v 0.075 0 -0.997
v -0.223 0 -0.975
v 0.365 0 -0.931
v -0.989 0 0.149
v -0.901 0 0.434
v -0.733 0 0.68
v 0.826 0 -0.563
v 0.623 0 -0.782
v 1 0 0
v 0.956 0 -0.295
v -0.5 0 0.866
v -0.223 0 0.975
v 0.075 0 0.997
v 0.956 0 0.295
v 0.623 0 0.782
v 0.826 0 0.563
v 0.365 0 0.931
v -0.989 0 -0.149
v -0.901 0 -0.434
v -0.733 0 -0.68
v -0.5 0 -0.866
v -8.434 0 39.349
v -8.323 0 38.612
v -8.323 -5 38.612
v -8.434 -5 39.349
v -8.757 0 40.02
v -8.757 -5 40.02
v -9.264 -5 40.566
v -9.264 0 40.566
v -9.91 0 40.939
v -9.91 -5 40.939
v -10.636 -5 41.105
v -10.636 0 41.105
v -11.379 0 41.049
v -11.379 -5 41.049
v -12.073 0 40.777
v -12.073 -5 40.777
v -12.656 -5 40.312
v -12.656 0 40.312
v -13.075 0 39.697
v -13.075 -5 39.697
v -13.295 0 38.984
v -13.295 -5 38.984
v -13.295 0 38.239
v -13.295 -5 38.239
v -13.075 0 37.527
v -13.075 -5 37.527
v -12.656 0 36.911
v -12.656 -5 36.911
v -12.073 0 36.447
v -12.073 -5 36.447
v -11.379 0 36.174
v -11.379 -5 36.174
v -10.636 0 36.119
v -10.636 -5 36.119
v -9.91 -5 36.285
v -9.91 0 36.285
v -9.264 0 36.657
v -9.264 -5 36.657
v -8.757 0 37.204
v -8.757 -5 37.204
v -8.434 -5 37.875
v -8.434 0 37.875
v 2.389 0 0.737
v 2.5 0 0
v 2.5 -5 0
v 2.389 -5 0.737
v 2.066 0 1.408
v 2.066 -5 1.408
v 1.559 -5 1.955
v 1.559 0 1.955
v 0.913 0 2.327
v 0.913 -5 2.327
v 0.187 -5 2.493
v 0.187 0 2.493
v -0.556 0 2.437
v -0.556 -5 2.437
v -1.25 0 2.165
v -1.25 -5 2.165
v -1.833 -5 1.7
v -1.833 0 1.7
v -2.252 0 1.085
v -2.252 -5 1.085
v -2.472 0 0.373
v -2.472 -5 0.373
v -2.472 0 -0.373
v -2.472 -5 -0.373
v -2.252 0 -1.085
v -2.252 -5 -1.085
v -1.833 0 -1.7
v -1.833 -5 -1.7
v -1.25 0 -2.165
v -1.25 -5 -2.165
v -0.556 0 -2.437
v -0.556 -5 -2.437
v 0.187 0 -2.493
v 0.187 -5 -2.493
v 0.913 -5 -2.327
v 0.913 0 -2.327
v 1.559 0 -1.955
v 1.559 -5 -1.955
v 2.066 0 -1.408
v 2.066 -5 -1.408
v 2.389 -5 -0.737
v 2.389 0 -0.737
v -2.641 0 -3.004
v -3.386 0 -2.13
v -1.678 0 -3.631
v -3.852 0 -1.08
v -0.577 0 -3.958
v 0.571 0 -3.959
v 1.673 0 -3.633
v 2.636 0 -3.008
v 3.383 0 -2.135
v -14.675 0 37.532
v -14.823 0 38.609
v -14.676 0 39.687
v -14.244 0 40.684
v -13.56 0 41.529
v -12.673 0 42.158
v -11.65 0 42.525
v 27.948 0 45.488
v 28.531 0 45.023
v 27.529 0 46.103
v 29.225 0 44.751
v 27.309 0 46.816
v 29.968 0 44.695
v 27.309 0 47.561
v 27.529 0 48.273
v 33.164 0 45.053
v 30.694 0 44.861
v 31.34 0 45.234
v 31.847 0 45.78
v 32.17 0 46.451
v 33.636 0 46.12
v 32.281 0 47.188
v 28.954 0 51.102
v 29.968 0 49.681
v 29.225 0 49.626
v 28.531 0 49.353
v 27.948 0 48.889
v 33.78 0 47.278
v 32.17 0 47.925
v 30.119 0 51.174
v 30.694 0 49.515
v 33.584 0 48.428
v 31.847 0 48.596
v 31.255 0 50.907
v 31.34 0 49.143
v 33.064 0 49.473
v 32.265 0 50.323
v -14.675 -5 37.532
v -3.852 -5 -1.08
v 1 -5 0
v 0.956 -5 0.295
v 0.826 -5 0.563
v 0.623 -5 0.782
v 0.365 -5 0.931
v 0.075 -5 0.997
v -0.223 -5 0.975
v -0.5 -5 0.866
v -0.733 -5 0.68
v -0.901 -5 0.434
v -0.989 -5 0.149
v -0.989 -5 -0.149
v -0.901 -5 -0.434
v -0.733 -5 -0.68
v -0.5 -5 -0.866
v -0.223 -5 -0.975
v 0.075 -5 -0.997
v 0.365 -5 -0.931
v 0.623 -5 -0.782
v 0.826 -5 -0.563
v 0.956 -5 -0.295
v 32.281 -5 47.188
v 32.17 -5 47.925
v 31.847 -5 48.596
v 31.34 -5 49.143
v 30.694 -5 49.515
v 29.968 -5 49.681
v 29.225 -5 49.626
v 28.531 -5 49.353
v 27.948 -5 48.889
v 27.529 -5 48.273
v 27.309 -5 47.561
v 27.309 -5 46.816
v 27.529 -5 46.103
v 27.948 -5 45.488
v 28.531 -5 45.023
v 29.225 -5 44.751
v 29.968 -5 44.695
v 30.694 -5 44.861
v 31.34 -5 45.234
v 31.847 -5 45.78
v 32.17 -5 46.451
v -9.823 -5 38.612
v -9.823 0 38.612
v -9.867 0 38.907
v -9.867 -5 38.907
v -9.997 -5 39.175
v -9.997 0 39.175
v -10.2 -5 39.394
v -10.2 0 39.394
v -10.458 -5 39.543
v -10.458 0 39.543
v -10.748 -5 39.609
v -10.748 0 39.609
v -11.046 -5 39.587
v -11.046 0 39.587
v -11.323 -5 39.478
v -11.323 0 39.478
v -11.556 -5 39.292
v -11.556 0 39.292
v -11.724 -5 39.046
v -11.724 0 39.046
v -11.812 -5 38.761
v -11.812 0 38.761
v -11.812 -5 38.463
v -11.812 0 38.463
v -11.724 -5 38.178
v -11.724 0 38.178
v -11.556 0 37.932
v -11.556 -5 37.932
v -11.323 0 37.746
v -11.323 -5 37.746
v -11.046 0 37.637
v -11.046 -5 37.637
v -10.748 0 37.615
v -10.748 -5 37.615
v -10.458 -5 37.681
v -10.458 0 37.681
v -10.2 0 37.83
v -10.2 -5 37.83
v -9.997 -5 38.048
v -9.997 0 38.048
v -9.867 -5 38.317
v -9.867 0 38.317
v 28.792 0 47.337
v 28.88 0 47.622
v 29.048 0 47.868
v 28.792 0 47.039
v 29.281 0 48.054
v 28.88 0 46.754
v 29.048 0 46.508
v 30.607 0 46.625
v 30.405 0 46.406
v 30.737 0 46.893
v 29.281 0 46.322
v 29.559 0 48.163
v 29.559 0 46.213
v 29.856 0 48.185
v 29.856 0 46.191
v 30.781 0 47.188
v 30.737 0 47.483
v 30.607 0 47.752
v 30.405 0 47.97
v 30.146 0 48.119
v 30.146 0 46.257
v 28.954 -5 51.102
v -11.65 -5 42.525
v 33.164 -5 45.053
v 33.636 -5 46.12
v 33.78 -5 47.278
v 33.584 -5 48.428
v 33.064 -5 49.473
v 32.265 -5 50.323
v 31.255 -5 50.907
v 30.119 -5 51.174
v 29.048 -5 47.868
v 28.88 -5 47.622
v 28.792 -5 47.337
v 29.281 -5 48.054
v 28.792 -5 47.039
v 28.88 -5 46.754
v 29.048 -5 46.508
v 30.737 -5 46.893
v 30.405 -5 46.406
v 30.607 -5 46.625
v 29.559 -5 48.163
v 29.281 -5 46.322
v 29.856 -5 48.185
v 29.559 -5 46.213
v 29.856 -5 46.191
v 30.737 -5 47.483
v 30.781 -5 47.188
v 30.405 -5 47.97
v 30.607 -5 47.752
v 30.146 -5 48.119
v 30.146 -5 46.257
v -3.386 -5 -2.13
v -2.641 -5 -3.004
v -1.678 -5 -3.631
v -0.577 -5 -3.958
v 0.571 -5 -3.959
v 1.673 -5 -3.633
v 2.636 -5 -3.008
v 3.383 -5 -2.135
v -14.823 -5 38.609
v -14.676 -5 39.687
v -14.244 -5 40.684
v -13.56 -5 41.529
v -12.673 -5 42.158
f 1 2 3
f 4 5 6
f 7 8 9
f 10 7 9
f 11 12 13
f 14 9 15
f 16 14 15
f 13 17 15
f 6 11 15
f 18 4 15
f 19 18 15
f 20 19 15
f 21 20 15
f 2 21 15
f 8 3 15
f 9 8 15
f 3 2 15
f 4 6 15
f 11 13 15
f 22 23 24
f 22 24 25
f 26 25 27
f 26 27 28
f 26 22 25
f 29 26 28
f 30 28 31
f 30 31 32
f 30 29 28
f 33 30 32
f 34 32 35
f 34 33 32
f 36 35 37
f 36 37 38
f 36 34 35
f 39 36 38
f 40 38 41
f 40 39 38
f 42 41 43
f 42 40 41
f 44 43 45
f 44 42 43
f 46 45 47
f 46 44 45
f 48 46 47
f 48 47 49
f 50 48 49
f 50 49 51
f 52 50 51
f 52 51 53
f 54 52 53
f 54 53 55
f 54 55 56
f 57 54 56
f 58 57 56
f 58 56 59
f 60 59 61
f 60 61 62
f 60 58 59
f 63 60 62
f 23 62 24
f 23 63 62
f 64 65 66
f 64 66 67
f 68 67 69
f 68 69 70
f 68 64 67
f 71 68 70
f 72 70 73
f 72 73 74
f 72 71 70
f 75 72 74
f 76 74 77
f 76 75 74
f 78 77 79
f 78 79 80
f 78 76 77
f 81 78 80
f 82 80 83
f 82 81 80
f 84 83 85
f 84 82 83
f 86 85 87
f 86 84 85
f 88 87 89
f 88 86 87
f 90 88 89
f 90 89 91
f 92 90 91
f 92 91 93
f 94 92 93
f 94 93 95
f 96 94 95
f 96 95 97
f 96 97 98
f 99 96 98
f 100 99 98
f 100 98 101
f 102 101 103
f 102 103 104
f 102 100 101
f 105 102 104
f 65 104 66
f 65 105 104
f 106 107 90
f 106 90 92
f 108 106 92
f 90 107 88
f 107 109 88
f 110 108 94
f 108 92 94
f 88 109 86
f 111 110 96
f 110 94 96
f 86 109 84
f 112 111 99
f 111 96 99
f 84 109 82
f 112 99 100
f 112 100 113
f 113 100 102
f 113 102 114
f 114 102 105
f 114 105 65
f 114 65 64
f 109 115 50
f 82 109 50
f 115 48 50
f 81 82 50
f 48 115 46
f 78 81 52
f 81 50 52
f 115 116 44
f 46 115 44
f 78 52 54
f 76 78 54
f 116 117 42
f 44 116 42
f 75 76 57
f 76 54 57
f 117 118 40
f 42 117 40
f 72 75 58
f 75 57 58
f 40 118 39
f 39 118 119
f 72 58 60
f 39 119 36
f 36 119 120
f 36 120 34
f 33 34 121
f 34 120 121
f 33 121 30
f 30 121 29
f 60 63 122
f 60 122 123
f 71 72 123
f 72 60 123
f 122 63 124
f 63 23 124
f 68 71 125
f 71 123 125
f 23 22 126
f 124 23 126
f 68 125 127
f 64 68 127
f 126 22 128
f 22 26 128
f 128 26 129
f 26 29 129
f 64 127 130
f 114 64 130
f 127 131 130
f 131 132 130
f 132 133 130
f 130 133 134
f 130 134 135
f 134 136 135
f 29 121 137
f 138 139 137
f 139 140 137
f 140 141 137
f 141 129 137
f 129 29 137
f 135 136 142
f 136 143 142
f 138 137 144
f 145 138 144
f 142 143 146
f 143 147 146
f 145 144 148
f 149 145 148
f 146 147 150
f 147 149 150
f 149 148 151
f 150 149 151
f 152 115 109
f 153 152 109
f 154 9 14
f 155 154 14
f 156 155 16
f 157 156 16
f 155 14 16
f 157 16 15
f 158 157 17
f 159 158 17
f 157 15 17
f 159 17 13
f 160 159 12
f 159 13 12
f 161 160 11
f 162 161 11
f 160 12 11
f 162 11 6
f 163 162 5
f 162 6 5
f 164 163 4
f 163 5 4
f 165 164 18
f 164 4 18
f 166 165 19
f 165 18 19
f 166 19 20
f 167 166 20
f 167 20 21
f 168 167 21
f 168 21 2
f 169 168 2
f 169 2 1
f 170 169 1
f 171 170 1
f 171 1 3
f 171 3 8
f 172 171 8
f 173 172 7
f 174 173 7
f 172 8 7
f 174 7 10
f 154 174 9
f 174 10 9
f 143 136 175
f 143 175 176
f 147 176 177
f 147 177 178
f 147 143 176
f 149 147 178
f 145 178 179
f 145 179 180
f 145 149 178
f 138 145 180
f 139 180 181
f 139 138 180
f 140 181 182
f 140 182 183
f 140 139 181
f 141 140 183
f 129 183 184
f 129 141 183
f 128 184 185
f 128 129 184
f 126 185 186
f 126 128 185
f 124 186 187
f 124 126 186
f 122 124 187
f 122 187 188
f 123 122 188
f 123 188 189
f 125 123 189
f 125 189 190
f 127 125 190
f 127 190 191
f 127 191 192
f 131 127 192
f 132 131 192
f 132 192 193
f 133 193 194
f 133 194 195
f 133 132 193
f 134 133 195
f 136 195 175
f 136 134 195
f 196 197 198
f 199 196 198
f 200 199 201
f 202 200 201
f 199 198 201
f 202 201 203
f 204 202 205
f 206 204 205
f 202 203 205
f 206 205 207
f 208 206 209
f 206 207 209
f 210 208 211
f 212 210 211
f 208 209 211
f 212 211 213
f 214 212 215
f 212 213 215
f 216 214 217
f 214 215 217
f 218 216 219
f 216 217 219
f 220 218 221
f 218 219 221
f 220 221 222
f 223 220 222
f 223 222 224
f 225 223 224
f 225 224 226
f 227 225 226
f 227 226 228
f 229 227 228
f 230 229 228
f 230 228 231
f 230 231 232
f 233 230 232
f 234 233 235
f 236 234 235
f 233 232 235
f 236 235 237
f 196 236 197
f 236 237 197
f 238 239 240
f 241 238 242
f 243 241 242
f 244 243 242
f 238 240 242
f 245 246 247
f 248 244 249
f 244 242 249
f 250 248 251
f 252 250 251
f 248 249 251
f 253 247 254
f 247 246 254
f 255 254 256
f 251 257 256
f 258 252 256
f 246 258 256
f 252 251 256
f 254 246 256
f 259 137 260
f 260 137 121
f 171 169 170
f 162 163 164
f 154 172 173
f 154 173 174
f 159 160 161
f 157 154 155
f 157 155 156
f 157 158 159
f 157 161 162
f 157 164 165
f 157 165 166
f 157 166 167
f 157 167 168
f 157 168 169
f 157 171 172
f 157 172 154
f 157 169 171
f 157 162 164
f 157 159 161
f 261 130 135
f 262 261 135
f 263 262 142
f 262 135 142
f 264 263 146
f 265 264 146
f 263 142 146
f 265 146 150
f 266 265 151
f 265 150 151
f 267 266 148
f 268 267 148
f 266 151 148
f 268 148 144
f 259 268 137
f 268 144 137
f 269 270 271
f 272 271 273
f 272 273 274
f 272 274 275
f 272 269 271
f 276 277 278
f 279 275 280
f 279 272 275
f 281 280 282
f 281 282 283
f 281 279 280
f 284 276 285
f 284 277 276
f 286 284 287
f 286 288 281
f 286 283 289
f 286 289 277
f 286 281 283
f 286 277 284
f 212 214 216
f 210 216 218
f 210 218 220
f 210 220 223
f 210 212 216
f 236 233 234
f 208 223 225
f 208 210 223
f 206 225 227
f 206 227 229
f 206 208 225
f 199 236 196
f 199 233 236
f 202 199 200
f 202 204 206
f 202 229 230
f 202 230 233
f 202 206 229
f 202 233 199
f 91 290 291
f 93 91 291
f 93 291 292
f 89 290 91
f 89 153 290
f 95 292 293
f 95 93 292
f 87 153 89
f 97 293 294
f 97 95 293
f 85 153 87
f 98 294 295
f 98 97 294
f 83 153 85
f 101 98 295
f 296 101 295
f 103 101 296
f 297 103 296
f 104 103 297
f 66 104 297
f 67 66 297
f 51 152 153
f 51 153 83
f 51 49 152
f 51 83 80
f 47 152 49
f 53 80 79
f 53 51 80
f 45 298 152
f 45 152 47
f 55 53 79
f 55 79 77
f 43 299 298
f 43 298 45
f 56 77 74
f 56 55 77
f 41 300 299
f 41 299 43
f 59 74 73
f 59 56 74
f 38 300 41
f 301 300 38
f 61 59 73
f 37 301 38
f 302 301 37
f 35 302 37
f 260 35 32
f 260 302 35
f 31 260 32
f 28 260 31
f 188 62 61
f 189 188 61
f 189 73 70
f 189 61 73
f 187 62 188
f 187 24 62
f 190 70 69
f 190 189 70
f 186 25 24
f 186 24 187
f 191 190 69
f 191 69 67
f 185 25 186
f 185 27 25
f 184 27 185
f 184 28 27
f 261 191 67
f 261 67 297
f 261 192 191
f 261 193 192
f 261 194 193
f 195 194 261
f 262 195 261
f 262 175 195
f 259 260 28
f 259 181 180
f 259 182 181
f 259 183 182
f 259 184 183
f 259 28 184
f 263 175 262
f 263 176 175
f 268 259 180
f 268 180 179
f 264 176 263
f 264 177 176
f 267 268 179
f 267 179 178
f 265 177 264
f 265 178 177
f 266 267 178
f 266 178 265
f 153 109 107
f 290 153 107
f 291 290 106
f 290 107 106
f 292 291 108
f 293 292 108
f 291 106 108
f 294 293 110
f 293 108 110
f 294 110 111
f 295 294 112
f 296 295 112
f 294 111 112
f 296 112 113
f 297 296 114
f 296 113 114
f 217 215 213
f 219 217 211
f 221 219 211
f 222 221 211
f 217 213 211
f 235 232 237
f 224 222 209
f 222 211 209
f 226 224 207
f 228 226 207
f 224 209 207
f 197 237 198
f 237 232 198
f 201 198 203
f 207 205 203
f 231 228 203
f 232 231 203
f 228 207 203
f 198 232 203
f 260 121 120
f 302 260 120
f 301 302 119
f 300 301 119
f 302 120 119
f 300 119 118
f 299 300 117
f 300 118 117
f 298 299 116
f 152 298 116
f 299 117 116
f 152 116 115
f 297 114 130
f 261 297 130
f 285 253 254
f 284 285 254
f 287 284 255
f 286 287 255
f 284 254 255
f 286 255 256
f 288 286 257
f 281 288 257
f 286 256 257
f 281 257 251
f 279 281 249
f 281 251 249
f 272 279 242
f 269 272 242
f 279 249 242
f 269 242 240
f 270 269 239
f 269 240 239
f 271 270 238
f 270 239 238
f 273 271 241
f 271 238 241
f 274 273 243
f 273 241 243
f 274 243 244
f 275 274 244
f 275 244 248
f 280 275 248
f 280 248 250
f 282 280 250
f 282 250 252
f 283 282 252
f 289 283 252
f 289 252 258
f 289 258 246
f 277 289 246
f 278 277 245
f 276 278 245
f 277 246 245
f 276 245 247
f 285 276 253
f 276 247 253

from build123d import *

# Parameters (mm, degrees)
F0_R     = 1
F1_DEPTH = 5
F0_R_2   = 2.5


with BuildPart() as f1:
    # F0 (on Front) → F1 (new body)
    with BuildSketch(Plane.XZ):
        with Locations((-10.8230100318, 38.6118175414)):
            Circle(F0_R)
    extrude(amount=F1_DEPTH)


with BuildPart() as f1b:
    # F0 (on Front) → F1, piece 2 (new body)
    with BuildSketch(Plane.XZ):
        with BuildLine():
            Line((-14.6745629038, 37.5322155432), (-3.851552872, -1.0796019982))
            ThreePointArc((-3.851552872, -1.0796019982), (-0.5773645618, -3.9581119442), (3.3826653178, -2.1348478512))
            Line((3.3826653178, -2.1348478512), (33.1637928422, 45.053333332))
            ThreePointArc((33.1637928422, 45.053333332), (33.0643281958, 49.4730429626), (28.9544900649, 51.1018329958))
            Line((28.9544900649, 51.1018329958), (-11.6496474913, 42.5254693541))
            ThreePointArc((-11.6496474913, 42.5254693541), (-14.2441958057, 40.6843734275), (-14.6745629038, 37.5322155432))
        make_face()
        Circle(F0_R_2, mode=Mode.SUBTRACT)
        with Locations((-10.8230100318, 38.6118175414)):
            Circle(F0_R_2, mode=Mode.SUBTRACT)
        with Locations((29.7811275244, 47.1881811832)):
            Circle(F0_R_2, mode=Mode.SUBTRACT)
    extrude(amount=F1_DEPTH)


with BuildPart() as f1c:
    # F0 (on Front) → F1, piece 3 (new body)
    with BuildSketch(Plane.XZ):
        with Locations((29.7811275244, 47.1881811832)):
            Circle(F0_R)
    extrude(amount=F1_DEPTH)


with BuildPart() as f1d:
    # F0 (on Front) → F1, piece 4 (new body)
    with BuildSketch(Plane.XZ):
        Circle(F0_R)
    extrude(amount=F1_DEPTH)


solid = Compound([f1.part, f1b.part, f1c.part, f1d.part])
